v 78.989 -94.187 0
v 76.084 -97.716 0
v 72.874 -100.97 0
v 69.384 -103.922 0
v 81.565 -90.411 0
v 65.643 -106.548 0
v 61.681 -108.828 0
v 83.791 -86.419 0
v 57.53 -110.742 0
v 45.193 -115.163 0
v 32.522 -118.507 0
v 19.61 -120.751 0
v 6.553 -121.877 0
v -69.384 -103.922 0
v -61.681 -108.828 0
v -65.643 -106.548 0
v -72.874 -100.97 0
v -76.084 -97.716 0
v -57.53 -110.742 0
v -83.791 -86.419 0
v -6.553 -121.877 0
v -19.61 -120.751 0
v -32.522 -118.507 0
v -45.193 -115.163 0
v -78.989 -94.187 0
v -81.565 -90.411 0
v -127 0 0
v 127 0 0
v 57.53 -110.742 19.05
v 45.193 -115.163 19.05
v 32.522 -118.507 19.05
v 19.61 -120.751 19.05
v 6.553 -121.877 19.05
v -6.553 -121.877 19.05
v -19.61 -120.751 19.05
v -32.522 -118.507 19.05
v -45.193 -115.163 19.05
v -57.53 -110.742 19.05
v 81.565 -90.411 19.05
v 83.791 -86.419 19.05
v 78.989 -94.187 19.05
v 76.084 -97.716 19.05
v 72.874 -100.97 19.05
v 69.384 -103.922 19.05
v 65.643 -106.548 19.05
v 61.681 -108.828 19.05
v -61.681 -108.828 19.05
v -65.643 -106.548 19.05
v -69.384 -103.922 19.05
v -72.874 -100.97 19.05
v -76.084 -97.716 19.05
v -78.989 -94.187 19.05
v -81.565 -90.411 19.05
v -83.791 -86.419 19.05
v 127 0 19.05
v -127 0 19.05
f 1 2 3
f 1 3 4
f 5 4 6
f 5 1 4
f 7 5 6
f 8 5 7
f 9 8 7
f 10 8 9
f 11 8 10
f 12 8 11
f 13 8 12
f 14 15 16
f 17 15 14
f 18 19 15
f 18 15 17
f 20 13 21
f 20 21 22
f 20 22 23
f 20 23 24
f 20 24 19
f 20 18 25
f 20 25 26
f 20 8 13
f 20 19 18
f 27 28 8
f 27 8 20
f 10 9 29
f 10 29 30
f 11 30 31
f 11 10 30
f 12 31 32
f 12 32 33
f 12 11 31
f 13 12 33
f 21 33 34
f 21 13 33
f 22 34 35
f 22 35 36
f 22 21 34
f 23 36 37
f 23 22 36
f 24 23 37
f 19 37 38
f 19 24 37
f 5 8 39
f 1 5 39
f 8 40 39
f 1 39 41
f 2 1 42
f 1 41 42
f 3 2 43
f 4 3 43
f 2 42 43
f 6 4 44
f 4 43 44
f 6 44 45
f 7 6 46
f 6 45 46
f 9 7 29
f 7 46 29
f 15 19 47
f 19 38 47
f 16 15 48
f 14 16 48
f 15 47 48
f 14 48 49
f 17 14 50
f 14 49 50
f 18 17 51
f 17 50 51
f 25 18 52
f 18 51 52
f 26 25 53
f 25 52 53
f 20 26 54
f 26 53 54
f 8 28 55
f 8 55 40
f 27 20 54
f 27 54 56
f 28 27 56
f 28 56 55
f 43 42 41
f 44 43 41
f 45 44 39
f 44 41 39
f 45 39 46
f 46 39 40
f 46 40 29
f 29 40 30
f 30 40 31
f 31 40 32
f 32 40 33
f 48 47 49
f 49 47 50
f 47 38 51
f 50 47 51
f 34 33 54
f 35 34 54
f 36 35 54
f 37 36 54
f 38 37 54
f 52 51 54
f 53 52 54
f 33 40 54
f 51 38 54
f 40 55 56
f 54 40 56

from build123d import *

# Parameters (mm, degrees)
BOSS_EXTRUDE1_DEPTH = 19.05
FILLET1_R           = 50.8


with BuildPart() as part:
    # Sketch1 → Boss-Extrude1 (new body)
    with BuildSketch(Plane.XY):
        with BuildLine():
            Line((-127, 0), (127, 0))
            Line((127, 0), (76.2, -101.6))
            ThreePointArc((76.2, -101.6), (0, -122.017728463), (-76.2, -101.6))
            Line((-76.2, -101.6), (-127, 0))
        make_face()
    extrude(amount=BOSS_EXTRUDE1_DEPTH)

    # Fillet1
    fillet1_edges = [part.edges().sort_by_distance(p)[0] for p in [
        (76.2, -101.6, 9.525),
        (-76.2, -101.6, 9.525),
    ]]
    fillet(fillet1_edges, radius=FILLET1_R)


solid = part.part
